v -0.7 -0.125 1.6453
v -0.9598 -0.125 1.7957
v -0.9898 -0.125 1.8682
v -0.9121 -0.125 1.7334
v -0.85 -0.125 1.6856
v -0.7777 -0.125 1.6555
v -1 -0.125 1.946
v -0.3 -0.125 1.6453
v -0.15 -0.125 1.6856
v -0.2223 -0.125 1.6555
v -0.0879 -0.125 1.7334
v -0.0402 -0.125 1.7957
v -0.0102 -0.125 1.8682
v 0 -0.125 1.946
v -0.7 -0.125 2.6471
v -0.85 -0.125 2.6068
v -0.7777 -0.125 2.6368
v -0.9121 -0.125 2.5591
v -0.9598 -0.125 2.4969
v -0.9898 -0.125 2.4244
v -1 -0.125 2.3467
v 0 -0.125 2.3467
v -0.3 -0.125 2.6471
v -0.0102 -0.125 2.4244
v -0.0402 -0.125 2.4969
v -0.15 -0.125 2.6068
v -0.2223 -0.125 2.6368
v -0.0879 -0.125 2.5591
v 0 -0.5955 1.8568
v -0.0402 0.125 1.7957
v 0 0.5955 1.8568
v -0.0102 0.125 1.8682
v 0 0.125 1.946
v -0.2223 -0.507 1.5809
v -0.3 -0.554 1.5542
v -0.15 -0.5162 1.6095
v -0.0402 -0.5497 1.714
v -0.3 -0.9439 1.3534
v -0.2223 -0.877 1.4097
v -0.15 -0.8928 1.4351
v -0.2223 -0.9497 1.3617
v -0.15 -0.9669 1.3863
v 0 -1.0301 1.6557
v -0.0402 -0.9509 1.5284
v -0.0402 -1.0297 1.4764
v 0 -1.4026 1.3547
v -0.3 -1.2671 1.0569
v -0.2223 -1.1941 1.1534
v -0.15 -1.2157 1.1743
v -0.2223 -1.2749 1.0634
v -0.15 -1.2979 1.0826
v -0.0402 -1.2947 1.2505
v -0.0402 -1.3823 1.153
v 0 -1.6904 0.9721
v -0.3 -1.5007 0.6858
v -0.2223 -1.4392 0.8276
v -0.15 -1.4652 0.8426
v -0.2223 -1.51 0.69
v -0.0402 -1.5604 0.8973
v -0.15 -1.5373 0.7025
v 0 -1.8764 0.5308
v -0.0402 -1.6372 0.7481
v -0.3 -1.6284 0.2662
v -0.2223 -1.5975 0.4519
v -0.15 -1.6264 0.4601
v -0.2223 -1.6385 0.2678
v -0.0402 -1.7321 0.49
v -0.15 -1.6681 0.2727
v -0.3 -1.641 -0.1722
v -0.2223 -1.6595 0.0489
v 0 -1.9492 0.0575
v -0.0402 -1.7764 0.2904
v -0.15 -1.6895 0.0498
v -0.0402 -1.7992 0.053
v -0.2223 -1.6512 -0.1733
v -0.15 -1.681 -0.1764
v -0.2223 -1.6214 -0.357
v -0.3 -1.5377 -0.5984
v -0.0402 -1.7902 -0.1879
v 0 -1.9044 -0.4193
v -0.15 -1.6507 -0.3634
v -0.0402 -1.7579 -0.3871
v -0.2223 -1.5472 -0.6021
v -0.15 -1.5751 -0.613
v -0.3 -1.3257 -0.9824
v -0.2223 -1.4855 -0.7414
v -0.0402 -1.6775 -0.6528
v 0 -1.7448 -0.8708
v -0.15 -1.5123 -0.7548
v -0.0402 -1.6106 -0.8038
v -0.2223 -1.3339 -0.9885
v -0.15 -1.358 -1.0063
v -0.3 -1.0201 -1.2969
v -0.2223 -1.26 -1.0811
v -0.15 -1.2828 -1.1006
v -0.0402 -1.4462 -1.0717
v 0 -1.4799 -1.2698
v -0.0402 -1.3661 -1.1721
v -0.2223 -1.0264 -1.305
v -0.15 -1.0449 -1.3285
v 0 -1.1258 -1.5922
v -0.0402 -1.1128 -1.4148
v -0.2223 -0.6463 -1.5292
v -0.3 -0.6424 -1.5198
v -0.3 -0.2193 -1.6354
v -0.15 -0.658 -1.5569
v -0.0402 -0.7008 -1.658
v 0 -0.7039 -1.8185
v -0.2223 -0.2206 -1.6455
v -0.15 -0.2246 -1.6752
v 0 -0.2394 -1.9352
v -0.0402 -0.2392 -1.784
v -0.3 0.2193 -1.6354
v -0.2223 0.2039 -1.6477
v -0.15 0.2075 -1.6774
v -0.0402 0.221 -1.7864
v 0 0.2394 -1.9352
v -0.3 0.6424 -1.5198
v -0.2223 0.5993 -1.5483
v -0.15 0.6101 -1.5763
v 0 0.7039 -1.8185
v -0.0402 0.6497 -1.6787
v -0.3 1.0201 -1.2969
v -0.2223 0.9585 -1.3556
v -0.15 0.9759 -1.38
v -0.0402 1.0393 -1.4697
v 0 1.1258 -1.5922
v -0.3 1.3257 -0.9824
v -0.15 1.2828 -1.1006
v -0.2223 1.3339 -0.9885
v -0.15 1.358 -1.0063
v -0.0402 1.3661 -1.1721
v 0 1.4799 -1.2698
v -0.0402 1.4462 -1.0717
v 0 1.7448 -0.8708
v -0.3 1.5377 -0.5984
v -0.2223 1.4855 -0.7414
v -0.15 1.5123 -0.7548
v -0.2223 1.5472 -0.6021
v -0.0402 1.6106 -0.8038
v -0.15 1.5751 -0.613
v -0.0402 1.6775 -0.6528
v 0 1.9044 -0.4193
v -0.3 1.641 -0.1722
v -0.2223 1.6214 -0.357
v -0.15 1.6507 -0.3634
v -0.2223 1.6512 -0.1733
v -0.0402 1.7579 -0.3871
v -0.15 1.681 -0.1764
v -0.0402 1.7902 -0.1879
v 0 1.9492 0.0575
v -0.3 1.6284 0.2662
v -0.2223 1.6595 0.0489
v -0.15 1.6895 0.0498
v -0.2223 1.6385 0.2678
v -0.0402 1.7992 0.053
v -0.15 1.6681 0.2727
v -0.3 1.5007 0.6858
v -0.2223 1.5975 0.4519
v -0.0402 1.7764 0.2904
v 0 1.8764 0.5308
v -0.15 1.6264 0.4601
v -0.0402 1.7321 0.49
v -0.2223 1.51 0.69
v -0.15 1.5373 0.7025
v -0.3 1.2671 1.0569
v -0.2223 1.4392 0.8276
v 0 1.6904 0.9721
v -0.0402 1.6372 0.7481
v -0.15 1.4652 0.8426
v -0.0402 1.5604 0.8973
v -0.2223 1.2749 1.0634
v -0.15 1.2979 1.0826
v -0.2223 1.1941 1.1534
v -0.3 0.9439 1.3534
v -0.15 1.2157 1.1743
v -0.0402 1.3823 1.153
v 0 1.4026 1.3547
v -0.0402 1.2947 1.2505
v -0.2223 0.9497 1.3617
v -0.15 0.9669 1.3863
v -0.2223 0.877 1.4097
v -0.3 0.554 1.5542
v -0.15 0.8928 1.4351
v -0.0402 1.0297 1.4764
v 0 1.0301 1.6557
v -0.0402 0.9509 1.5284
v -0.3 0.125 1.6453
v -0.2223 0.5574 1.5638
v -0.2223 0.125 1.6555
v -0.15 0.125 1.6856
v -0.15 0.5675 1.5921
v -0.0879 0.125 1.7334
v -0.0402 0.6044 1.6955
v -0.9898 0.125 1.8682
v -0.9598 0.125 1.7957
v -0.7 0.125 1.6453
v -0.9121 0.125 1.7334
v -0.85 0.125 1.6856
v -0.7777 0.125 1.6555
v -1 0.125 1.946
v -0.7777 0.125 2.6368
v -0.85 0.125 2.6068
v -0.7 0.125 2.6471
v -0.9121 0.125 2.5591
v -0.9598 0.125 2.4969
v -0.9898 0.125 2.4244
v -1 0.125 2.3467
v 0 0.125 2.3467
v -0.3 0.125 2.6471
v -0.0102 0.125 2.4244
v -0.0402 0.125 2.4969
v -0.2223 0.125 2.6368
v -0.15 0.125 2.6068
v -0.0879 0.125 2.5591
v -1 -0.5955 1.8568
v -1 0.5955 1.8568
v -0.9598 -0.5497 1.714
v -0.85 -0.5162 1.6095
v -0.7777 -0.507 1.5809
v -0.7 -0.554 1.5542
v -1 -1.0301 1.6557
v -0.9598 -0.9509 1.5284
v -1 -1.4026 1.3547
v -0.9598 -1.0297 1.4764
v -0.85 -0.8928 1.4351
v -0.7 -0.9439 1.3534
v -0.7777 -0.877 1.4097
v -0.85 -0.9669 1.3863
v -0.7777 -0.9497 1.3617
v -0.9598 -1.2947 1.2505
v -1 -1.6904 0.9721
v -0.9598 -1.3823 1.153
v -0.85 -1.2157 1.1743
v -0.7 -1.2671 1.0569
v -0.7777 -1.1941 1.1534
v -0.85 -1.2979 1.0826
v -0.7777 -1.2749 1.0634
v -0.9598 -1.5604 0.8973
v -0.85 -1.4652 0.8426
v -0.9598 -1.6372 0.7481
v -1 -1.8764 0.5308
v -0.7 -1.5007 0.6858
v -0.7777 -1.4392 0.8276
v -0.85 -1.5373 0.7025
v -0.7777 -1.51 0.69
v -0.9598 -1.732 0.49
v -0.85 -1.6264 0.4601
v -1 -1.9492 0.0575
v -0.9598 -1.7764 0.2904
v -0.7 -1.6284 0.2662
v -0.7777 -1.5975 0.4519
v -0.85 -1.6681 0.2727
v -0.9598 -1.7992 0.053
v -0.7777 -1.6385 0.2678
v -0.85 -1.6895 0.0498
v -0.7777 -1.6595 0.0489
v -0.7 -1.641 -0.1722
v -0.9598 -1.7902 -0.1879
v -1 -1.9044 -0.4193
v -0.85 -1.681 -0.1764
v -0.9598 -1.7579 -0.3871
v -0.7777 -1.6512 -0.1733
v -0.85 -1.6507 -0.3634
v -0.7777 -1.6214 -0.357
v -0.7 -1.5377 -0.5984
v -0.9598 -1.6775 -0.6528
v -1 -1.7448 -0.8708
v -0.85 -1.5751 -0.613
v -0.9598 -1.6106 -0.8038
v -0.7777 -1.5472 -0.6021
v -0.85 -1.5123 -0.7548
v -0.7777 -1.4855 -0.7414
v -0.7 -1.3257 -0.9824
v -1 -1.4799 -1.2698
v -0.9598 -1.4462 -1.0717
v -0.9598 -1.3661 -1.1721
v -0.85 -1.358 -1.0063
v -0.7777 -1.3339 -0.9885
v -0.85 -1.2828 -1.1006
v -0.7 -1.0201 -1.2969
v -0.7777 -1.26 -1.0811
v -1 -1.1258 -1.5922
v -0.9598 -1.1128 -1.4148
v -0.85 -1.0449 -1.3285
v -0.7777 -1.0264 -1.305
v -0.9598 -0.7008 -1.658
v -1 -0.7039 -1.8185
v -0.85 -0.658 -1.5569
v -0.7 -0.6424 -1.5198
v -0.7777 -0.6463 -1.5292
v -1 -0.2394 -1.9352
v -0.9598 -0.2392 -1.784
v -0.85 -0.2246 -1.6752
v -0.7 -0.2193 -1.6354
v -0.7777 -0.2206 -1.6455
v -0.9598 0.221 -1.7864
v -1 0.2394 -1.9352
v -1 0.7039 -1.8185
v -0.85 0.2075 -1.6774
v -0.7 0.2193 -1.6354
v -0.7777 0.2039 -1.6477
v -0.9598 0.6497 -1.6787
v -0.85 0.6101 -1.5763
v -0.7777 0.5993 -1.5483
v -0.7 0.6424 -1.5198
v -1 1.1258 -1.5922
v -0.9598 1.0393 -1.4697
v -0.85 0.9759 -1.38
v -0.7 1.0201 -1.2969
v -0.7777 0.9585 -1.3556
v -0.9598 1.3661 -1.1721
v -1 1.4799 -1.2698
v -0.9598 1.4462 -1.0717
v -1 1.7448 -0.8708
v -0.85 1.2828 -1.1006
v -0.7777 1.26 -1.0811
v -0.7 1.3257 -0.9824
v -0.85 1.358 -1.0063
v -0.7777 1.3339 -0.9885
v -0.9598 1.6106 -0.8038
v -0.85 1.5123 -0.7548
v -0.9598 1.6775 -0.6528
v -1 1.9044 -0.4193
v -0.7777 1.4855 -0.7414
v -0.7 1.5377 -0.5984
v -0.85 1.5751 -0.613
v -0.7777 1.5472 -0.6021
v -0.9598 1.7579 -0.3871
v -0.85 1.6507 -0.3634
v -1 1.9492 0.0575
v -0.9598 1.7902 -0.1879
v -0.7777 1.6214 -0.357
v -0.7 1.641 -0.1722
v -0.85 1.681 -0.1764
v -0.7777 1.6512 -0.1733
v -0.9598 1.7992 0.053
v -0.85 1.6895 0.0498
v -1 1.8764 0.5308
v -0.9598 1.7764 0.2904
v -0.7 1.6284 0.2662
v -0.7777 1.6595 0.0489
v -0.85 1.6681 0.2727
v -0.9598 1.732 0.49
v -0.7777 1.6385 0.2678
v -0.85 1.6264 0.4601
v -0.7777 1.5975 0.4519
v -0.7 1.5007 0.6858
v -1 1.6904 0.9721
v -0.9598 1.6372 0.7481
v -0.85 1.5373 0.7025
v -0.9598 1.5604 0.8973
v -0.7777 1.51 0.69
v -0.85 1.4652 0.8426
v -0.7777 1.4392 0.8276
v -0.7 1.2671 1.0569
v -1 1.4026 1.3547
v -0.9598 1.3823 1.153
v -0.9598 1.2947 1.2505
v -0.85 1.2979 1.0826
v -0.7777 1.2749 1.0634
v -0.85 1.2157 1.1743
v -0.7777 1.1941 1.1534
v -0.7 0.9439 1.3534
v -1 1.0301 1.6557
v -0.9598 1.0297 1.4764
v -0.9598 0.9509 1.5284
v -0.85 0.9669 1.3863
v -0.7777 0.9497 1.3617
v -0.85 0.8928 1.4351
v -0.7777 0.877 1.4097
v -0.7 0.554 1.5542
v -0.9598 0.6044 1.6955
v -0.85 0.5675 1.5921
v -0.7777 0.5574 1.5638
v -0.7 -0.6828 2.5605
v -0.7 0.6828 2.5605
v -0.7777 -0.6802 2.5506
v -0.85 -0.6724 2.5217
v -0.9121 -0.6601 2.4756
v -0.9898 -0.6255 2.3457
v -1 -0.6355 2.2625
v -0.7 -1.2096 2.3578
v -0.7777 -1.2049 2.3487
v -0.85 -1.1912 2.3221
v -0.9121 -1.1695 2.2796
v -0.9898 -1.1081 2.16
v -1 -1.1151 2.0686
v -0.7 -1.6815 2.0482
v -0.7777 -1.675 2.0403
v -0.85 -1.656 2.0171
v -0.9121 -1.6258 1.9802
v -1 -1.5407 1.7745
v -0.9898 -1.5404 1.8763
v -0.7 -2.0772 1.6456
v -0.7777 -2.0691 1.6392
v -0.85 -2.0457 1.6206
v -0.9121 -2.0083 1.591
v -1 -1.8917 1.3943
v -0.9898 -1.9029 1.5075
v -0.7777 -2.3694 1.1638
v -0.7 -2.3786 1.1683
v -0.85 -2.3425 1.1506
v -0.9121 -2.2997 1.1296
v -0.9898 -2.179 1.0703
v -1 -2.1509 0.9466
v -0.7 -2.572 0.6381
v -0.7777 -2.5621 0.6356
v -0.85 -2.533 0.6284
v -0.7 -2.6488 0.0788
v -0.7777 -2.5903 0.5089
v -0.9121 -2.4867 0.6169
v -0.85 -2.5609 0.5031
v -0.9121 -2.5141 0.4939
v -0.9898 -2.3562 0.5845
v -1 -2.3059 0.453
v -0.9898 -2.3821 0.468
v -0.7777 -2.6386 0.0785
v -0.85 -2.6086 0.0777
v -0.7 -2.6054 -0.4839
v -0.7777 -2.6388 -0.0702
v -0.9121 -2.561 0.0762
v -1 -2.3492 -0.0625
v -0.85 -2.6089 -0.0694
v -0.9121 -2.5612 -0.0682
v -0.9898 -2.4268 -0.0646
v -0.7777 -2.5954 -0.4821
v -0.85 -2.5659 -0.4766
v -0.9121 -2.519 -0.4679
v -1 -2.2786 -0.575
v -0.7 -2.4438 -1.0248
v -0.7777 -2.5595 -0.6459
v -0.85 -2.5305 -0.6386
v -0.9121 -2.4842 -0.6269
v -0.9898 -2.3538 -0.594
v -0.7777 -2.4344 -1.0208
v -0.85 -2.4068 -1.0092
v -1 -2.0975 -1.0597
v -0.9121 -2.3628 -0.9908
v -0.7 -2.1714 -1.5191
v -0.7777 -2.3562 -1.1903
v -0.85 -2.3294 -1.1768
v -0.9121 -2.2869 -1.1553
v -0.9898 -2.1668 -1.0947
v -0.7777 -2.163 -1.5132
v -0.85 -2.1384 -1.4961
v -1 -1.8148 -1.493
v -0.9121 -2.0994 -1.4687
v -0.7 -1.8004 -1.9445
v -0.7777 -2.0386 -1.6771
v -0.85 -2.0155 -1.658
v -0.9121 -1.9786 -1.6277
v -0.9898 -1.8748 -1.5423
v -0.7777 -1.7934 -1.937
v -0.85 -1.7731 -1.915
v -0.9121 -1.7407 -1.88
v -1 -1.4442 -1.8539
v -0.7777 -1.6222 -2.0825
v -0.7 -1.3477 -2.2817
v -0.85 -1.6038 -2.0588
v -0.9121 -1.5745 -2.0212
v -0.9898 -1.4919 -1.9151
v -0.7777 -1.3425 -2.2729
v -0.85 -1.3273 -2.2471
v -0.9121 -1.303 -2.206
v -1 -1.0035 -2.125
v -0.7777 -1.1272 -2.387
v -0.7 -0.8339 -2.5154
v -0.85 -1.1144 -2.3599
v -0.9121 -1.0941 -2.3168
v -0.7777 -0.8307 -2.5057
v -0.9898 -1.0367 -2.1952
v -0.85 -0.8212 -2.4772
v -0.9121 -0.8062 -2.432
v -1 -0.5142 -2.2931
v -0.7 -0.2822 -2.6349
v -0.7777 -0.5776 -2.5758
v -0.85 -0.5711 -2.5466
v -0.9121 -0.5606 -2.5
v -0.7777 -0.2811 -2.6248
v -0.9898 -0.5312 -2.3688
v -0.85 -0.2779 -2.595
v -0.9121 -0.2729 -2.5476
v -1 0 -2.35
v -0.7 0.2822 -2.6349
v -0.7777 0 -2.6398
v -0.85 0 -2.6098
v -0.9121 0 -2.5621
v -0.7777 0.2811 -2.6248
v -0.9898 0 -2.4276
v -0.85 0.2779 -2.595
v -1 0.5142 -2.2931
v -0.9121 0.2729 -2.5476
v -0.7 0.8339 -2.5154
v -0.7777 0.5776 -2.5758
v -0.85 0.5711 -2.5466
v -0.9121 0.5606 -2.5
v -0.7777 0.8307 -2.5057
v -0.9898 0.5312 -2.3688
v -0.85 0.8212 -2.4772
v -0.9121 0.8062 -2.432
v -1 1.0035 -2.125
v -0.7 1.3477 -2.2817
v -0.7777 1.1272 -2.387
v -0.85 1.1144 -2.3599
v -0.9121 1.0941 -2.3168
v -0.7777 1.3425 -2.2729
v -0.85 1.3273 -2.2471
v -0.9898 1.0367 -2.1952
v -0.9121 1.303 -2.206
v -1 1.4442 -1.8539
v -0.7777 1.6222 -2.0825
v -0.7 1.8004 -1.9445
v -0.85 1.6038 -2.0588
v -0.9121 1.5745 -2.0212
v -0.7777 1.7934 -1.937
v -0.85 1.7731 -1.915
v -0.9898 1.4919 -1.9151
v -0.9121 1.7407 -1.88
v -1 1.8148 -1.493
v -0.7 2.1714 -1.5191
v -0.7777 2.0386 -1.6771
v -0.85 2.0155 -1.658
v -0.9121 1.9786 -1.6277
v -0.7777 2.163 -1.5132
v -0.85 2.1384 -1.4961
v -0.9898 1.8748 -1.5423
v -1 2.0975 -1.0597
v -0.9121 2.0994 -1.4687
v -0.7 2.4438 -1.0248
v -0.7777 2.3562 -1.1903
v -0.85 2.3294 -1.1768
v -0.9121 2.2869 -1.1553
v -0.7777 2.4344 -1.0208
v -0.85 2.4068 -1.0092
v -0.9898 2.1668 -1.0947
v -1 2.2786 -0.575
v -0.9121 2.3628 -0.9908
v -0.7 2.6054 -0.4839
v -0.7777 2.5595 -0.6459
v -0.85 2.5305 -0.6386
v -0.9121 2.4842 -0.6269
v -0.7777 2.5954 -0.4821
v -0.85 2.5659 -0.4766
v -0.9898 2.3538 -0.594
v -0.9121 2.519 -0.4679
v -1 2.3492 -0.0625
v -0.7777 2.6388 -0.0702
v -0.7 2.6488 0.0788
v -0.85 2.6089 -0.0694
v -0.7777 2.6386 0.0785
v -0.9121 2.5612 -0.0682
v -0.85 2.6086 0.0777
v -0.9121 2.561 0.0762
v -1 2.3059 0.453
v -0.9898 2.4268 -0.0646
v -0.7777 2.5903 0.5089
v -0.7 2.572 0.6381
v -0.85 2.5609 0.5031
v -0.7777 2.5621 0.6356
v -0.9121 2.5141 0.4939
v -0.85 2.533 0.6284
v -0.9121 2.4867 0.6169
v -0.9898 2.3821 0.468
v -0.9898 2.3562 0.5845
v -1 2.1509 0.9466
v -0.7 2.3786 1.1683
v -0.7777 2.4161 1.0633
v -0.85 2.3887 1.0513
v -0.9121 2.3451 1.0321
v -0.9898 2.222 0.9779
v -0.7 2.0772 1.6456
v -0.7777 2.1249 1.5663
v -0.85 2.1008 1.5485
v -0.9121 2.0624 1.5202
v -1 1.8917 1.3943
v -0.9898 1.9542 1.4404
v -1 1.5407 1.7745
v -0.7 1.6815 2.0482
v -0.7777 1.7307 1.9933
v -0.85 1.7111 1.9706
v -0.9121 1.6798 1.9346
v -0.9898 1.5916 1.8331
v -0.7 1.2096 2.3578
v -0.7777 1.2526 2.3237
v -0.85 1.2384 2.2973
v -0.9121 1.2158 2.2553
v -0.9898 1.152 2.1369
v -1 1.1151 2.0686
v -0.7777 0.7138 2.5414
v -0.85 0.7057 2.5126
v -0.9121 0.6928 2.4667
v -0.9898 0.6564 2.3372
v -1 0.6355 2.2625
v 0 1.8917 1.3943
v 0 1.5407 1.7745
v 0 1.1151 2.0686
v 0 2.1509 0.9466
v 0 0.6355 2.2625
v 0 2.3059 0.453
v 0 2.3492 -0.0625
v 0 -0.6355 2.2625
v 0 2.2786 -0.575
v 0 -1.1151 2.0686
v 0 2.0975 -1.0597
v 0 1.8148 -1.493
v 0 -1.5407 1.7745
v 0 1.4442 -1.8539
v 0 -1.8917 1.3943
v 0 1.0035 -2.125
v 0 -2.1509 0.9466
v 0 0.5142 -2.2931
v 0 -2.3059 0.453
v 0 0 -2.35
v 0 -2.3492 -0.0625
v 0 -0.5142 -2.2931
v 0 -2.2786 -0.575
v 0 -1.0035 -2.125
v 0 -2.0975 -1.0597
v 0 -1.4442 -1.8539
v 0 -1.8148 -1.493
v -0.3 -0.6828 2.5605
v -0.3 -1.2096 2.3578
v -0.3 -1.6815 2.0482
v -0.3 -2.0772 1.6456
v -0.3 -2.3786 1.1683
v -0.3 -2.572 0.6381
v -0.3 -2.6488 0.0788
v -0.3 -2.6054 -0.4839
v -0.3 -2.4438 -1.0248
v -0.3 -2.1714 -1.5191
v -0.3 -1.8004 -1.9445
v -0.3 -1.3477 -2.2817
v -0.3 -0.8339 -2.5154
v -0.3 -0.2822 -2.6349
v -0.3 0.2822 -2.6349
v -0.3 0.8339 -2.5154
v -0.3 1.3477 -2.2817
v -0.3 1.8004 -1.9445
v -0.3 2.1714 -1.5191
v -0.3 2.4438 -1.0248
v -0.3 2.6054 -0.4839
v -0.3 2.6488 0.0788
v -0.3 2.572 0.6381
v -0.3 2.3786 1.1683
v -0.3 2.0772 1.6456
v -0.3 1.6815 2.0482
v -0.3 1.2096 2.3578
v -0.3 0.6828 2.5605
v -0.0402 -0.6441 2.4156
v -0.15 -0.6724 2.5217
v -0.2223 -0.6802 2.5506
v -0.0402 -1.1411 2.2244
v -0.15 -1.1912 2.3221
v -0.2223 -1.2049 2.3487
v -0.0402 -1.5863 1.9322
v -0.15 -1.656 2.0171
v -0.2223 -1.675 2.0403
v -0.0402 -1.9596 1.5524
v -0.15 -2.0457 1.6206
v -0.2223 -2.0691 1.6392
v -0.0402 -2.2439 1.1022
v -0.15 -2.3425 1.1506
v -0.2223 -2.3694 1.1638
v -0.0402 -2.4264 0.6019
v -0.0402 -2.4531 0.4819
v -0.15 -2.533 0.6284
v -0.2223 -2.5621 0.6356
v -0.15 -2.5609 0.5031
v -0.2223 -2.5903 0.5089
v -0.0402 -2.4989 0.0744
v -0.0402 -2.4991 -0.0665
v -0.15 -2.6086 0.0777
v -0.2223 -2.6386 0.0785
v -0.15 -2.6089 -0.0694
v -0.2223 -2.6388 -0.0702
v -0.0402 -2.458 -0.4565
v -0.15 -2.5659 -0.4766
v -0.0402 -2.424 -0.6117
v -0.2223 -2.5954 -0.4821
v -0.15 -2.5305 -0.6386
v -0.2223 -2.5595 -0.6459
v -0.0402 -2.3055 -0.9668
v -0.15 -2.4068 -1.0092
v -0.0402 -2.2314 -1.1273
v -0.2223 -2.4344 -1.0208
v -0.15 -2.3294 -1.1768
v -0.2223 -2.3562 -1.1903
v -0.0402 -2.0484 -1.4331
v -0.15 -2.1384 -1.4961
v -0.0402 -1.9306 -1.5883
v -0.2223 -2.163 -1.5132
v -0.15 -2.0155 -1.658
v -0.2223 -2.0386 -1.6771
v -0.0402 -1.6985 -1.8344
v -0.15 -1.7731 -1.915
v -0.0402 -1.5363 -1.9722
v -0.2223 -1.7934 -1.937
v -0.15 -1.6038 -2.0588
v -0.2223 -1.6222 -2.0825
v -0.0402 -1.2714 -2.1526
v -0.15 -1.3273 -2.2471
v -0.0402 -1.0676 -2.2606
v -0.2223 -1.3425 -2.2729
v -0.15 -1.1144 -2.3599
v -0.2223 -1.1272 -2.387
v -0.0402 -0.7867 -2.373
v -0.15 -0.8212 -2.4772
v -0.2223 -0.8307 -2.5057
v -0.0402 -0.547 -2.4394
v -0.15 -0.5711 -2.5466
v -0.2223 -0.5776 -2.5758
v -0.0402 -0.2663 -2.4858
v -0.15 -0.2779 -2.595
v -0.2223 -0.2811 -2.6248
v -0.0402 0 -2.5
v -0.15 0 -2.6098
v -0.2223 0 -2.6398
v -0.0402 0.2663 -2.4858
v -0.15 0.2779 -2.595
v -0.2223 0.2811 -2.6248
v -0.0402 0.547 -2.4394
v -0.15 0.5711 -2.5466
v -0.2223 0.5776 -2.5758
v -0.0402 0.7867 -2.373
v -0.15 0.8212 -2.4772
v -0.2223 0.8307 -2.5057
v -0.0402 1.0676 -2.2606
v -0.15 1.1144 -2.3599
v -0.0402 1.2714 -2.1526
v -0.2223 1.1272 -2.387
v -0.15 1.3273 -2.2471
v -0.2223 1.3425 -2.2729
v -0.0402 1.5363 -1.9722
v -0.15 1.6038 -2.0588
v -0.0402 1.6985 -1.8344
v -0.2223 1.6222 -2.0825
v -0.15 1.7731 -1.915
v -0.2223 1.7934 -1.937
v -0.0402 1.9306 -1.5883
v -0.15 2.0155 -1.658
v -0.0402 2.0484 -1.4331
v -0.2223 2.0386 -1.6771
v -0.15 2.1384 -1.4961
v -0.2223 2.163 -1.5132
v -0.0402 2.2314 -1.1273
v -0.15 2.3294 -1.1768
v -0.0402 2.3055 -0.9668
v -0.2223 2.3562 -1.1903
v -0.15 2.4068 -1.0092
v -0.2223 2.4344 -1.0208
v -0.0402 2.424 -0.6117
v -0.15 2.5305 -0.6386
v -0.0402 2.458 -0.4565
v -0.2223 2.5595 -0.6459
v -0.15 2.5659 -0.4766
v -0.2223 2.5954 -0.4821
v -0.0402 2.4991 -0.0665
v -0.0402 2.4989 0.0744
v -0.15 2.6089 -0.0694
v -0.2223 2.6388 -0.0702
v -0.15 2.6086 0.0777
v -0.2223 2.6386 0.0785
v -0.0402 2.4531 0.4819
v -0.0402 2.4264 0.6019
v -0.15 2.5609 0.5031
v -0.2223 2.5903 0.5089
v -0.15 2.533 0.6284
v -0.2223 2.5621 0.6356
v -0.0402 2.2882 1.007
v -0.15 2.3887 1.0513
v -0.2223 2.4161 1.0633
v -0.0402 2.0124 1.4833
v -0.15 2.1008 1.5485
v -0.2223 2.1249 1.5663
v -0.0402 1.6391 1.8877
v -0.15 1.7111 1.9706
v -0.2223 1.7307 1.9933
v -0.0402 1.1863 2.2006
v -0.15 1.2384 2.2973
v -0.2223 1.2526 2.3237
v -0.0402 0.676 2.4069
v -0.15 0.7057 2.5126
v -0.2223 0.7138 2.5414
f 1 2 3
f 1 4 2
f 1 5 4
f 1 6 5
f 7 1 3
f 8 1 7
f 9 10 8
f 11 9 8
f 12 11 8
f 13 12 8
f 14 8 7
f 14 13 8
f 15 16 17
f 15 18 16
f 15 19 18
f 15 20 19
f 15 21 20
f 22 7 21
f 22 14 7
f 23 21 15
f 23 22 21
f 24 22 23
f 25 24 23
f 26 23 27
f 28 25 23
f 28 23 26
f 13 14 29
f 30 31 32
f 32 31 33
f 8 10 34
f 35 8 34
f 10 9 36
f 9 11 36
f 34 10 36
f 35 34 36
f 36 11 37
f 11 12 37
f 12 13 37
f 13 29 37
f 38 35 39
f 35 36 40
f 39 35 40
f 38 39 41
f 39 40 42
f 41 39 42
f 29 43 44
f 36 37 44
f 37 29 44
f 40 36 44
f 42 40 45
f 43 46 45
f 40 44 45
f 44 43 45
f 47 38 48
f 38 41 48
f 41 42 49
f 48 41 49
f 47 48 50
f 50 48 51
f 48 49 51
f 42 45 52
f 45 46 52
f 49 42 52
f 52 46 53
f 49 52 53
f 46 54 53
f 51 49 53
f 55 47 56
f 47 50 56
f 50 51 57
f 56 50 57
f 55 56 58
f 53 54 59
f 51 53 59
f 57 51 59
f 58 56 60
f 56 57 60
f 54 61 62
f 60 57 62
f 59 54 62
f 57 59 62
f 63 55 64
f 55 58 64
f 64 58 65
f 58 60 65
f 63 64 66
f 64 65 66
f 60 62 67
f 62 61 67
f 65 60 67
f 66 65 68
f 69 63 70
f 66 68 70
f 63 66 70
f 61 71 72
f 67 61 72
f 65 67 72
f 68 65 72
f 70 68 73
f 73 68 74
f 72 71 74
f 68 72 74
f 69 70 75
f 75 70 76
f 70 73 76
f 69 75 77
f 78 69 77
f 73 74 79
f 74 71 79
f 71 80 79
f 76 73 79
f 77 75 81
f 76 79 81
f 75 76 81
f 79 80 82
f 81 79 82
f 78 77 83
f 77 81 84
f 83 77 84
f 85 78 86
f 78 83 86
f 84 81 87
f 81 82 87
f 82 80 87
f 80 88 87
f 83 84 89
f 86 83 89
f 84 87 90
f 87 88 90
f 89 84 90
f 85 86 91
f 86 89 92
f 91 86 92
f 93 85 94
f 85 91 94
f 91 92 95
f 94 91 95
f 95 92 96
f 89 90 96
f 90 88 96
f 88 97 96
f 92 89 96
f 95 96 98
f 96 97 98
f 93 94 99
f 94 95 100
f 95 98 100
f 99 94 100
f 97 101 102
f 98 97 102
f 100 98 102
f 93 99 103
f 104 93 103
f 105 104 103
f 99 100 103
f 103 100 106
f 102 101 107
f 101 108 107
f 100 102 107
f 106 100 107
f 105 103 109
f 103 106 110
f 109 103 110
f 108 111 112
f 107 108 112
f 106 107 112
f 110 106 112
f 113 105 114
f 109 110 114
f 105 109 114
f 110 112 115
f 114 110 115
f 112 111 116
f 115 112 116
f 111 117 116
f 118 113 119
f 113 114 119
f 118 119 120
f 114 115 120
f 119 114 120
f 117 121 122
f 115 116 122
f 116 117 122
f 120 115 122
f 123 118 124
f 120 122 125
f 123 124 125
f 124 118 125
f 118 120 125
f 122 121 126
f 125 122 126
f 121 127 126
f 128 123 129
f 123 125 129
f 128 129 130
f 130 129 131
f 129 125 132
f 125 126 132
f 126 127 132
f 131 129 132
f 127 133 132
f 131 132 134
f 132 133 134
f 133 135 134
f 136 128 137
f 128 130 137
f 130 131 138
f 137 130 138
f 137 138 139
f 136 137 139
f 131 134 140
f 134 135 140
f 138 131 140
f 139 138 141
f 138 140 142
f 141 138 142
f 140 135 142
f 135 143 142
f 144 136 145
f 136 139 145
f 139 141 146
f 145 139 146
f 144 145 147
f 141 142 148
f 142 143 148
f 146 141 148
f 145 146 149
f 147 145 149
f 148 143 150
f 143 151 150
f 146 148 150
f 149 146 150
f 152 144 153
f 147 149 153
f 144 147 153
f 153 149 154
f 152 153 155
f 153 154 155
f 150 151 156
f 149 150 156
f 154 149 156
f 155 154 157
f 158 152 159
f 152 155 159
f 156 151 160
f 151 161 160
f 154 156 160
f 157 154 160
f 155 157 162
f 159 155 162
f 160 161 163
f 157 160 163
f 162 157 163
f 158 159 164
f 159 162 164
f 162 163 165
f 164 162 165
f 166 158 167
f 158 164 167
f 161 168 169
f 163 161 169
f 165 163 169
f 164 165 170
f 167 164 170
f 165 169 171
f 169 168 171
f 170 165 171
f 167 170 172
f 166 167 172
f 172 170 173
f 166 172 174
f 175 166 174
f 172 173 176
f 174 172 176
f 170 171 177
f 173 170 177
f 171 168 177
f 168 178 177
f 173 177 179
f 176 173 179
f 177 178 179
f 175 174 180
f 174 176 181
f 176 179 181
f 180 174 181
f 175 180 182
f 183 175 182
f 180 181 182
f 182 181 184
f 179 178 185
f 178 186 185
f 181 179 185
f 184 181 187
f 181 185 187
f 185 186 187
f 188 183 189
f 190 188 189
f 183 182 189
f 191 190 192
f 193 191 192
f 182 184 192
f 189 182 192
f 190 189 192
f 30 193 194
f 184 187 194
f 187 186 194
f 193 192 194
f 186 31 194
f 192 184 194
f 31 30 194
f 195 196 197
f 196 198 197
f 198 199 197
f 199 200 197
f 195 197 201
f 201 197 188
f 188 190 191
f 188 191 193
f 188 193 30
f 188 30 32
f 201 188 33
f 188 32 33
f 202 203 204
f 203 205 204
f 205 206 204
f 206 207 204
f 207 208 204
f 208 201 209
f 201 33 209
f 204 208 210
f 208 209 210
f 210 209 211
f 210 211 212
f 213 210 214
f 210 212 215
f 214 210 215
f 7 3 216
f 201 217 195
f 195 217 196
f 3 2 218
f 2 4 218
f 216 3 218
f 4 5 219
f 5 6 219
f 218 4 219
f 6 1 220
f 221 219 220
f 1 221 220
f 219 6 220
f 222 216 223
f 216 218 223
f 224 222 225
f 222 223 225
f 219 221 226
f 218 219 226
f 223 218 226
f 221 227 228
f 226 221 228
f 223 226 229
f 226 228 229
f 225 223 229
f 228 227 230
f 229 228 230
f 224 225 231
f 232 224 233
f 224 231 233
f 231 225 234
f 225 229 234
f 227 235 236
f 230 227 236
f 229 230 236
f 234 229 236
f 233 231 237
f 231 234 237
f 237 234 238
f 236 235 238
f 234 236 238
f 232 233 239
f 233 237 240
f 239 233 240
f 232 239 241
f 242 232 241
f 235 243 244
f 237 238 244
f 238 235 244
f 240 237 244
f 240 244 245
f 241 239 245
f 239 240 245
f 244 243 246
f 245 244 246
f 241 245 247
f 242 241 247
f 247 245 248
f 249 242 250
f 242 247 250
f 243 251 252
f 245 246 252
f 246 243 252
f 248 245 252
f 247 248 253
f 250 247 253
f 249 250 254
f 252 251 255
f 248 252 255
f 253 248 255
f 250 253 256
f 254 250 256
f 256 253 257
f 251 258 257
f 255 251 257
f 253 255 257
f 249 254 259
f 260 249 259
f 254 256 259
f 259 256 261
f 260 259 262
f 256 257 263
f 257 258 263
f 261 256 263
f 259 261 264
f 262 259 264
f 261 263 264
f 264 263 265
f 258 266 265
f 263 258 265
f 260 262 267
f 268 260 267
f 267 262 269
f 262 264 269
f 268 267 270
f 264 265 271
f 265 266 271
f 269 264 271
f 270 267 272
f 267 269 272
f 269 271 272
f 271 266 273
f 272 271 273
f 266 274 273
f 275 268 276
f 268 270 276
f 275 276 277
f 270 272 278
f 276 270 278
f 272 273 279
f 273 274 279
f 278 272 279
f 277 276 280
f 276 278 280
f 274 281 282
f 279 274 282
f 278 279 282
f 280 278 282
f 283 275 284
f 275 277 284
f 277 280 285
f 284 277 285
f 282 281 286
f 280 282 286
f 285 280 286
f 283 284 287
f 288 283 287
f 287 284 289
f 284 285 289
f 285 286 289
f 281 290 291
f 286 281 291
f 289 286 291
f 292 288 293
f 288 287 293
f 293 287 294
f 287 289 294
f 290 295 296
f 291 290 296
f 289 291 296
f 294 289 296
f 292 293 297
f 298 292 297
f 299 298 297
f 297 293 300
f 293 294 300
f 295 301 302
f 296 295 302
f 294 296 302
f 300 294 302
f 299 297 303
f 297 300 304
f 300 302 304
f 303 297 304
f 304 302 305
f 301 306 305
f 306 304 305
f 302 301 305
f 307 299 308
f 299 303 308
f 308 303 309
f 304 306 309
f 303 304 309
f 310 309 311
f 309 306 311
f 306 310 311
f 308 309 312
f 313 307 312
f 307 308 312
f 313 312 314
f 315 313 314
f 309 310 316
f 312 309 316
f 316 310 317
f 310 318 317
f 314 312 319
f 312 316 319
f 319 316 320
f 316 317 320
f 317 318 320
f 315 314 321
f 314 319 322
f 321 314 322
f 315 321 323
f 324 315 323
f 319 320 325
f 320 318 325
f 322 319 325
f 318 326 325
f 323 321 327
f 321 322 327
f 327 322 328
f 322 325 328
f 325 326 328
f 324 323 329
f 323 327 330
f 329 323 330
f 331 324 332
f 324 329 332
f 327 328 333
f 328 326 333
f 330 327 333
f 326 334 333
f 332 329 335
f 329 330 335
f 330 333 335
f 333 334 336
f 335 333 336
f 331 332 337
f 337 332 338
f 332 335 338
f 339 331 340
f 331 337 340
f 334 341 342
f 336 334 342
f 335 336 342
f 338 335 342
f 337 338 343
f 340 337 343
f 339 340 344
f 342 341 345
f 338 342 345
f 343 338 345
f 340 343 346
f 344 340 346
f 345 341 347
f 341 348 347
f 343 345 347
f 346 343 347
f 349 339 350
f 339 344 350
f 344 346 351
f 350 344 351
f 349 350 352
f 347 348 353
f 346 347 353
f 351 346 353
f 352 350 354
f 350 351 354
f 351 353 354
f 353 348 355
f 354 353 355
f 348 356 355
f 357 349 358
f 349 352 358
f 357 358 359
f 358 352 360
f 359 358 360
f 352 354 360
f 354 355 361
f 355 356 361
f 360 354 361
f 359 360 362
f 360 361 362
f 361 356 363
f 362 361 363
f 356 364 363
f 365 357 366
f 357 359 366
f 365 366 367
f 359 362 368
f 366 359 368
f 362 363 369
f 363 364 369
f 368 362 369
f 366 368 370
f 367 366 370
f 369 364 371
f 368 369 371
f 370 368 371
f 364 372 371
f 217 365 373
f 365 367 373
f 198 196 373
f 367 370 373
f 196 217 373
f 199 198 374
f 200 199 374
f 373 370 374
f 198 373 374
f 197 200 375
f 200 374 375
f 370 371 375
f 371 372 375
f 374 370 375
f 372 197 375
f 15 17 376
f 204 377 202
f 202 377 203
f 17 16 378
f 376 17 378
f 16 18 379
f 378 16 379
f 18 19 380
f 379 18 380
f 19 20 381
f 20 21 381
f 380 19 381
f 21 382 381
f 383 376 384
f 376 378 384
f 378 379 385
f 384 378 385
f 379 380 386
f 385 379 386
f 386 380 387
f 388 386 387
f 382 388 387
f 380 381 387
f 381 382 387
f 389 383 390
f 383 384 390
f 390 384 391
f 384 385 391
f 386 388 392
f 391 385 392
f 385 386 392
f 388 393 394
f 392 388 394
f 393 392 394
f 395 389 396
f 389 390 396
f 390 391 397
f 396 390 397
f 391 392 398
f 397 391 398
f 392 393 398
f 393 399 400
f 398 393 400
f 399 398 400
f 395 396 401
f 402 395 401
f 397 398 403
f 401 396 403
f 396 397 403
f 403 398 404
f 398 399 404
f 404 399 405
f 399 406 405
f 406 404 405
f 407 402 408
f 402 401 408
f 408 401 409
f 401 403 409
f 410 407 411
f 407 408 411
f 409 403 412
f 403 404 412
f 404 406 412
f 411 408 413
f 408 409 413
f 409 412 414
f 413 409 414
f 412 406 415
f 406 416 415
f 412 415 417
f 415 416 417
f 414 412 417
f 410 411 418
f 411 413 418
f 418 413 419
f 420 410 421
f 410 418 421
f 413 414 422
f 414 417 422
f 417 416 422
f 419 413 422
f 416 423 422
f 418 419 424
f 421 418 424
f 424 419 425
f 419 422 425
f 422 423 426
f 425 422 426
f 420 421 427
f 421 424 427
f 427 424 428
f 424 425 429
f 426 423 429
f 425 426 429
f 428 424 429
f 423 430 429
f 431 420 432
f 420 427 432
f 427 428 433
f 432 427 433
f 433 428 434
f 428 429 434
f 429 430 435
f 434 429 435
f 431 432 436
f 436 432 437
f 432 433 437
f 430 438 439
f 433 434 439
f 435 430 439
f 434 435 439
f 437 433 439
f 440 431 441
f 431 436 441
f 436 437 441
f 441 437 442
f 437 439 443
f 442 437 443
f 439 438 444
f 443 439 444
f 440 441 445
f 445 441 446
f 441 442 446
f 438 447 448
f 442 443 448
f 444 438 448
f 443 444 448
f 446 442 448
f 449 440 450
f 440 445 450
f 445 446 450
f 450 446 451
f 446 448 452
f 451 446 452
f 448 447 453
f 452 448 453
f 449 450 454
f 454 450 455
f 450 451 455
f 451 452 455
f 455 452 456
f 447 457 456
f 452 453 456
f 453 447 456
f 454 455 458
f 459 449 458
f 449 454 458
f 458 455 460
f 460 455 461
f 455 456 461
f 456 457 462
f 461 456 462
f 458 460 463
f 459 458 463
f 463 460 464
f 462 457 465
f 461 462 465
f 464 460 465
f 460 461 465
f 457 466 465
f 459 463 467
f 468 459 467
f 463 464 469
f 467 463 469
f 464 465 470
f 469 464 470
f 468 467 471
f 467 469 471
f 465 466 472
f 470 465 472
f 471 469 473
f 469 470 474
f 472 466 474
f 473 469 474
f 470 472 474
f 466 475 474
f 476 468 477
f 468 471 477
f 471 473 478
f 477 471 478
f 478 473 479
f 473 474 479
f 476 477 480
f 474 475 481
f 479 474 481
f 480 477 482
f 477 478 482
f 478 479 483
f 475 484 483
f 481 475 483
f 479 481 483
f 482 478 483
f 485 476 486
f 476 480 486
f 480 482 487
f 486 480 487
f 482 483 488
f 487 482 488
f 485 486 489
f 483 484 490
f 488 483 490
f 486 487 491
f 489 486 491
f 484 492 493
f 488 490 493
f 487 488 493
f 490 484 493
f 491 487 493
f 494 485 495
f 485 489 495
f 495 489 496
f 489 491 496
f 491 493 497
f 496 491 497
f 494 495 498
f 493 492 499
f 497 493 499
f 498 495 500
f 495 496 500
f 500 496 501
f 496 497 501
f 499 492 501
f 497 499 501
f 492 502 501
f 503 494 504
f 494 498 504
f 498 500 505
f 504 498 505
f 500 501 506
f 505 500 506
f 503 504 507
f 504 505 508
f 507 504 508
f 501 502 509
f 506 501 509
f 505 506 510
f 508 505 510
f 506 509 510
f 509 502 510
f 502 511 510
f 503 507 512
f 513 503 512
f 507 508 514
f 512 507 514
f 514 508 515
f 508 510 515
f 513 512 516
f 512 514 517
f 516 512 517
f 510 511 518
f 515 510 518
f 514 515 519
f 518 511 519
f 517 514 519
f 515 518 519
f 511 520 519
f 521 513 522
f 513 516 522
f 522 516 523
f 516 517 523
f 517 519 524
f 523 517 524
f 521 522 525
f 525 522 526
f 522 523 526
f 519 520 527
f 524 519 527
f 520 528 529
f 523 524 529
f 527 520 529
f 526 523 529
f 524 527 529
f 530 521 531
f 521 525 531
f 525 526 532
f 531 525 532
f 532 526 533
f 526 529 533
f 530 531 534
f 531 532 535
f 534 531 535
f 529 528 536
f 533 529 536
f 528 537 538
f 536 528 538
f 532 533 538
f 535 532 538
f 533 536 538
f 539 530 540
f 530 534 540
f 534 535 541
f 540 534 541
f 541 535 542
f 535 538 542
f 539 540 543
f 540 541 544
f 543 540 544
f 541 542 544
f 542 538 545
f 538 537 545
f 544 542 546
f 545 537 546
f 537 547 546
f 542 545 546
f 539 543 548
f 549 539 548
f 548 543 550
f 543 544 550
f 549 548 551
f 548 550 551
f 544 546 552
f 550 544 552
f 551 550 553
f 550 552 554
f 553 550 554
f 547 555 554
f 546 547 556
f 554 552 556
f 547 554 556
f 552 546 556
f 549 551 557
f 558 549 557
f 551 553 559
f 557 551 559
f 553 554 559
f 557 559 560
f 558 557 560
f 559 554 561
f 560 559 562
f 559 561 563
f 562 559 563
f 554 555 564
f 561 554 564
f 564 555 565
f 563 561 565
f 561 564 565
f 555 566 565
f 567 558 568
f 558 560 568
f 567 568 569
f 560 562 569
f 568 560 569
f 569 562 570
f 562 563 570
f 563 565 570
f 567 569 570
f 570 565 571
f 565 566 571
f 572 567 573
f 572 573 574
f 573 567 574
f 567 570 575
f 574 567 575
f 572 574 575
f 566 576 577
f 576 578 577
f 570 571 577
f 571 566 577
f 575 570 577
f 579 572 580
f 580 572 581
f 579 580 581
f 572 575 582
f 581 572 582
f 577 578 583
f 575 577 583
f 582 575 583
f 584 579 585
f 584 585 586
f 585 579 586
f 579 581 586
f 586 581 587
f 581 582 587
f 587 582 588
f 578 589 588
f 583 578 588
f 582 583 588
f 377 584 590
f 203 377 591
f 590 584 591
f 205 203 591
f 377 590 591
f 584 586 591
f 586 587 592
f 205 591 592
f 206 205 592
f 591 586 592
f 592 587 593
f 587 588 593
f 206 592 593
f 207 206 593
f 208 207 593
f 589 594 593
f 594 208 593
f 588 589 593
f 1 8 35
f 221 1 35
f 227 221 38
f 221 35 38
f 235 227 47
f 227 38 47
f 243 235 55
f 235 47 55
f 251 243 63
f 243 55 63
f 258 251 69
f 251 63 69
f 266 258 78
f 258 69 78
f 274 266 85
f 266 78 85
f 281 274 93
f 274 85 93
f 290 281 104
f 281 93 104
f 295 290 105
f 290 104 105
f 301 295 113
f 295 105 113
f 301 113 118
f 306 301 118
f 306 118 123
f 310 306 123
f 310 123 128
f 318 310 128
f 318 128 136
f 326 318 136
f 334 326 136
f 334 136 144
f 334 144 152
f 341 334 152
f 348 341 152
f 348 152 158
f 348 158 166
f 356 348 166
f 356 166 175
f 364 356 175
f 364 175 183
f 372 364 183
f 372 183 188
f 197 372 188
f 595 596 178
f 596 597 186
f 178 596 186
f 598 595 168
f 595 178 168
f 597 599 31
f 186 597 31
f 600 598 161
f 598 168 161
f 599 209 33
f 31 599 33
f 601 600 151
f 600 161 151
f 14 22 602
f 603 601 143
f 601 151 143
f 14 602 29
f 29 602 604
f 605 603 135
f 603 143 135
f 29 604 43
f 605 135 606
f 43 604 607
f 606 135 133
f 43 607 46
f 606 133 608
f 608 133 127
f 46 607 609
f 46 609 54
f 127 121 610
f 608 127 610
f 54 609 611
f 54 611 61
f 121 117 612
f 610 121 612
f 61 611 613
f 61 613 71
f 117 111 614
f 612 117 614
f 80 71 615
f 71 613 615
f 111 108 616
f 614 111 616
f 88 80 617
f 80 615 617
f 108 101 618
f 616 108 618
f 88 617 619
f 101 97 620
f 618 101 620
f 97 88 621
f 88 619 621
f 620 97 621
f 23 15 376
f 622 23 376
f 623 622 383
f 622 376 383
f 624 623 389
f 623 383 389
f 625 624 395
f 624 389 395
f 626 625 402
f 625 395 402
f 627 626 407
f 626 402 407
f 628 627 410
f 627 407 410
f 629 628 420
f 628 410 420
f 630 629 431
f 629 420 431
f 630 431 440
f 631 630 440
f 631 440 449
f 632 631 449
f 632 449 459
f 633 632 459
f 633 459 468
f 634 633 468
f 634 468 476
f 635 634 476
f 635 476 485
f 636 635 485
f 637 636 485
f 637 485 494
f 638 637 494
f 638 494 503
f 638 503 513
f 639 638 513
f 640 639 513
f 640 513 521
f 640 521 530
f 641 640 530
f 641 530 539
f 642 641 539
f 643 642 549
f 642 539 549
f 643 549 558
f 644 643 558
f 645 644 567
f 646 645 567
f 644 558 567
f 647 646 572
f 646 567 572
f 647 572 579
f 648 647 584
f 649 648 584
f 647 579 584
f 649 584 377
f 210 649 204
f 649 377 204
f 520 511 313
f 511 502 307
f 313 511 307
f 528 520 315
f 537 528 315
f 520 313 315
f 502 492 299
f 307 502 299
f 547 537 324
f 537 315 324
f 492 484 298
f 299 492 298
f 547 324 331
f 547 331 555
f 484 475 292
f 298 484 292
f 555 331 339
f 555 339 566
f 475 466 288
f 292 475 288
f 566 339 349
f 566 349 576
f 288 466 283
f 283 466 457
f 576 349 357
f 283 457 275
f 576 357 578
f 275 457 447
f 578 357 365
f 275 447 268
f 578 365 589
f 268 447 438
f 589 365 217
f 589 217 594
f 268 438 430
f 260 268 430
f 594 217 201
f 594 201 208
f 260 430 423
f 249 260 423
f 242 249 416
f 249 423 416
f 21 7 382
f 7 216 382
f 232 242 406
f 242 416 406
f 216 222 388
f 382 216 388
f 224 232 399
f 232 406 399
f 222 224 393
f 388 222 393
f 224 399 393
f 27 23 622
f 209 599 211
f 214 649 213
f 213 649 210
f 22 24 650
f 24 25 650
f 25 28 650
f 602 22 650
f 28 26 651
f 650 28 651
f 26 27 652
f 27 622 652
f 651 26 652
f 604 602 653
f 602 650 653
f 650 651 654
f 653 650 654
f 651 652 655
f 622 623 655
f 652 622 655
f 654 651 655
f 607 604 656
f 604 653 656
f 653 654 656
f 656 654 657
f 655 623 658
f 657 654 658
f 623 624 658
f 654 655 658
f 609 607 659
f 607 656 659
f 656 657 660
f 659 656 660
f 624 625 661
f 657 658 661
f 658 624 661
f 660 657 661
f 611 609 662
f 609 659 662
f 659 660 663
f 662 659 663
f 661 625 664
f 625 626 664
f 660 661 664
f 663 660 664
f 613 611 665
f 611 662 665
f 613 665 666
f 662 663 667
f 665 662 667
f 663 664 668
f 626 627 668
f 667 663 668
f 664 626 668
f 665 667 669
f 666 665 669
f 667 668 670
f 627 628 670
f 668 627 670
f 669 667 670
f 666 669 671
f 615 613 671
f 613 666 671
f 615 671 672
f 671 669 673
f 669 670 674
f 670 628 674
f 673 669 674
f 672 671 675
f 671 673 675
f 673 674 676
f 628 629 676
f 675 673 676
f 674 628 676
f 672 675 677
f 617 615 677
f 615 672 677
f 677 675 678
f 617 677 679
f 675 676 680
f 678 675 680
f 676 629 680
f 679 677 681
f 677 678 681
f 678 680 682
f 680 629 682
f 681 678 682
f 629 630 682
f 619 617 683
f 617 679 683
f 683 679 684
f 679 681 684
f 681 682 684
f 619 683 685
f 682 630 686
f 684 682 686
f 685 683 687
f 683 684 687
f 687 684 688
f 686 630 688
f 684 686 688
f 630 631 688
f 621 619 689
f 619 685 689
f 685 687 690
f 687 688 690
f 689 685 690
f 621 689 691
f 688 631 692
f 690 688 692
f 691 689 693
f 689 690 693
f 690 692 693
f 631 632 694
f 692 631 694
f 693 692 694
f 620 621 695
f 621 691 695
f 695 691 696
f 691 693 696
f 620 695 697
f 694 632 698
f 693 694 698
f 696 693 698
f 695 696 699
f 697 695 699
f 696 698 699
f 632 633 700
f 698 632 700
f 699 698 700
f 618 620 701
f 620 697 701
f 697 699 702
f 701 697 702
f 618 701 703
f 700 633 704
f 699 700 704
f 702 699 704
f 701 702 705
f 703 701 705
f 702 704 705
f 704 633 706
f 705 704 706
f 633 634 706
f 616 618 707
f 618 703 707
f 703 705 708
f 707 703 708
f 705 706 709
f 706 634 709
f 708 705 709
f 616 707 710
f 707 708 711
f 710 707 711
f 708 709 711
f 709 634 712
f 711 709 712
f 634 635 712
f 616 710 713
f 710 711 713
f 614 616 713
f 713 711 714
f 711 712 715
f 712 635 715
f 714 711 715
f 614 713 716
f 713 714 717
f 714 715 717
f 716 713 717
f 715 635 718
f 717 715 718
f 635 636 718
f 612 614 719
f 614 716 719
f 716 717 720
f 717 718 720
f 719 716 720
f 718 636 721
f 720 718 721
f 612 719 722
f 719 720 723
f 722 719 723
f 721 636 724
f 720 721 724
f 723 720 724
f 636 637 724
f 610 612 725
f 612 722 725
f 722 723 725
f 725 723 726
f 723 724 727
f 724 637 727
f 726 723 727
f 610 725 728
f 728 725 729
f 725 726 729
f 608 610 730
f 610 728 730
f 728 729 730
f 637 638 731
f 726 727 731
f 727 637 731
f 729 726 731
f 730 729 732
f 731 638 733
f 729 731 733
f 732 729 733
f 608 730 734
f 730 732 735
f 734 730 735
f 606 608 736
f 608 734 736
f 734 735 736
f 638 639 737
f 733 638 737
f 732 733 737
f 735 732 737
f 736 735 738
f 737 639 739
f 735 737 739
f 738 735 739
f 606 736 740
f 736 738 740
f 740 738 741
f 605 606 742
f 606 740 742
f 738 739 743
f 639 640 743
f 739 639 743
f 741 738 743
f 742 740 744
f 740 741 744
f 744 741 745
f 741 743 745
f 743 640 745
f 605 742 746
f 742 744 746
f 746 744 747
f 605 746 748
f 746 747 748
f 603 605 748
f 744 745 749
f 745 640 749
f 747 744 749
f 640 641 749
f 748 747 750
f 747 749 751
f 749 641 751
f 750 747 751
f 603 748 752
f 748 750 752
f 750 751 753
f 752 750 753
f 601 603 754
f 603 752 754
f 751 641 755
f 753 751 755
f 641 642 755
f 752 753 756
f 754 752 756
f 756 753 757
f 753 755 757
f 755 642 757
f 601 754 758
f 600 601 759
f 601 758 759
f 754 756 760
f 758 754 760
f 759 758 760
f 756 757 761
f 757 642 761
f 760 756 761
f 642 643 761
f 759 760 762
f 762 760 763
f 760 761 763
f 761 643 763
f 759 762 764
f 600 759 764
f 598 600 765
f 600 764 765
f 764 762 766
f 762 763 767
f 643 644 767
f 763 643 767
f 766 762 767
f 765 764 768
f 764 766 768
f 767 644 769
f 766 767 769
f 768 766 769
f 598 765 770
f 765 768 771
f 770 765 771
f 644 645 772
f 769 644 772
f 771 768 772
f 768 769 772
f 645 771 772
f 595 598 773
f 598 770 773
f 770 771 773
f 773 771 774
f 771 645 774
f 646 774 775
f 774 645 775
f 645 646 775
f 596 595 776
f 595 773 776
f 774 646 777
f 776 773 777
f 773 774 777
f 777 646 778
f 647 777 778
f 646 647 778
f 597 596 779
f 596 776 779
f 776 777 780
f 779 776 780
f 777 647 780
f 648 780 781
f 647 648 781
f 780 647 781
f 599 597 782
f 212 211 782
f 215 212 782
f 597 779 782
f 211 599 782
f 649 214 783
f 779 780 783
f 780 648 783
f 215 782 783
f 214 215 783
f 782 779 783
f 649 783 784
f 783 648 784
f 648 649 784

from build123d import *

# Parameters (mm, degrees)
SKETCH2_W = 0.25
SKETCH2_H = 2.703
GAP_DEPTH = 4.878788607


with BuildPart() as part:
    # Sketch1 → Base-Revolve (revolve)
    with BuildSketch(Plane.XY, mode=Mode.PRIVATE) as base_revolve_sk:
        with BuildLine():
            Line((0, 1.95), (0, 2.35))
            ThreePointArc((0, 2.35), (-0.087867966, 2.562132034), (-0.3, 2.65))
            Line((-0.3, 2.65), (-0.7, 2.65))
            ThreePointArc((-0.7, 2.65), (-0.912132034, 2.562132034), (-1, 2.35))
            Line((-1, 2.35), (-1, 1.95))
            ThreePointArc((-1, 1.95), (-0.912132034, 1.737867966), (-0.7, 1.65))
            Line((-0.7, 1.65), (-0.3, 1.65))
            ThreePointArc((-0.3, 1.65), (-0.087867966, 1.737867966), (0, 1.95))
        make_face()
    revolve(base_revolve_sk.sketch.rotate(Axis((-34.925, 0, 0), (1, 0, 0)), 90), axis=Axis((-34.925, 0, 0), (1, 0, 0)))

    # Sketch2 → Gap (cut, through all)
    with BuildSketch(Plane(origin=(0, 0, 0), x_dir=(0, -1, 0), z_dir=(-1, 0, 0))):
        with Locations((0, 1.3515)):
            Rectangle(SKETCH2_W, SKETCH2_H)
    extrude(amount=GAP_DEPTH, mode=Mode.SUBTRACT)


solid = part.part
